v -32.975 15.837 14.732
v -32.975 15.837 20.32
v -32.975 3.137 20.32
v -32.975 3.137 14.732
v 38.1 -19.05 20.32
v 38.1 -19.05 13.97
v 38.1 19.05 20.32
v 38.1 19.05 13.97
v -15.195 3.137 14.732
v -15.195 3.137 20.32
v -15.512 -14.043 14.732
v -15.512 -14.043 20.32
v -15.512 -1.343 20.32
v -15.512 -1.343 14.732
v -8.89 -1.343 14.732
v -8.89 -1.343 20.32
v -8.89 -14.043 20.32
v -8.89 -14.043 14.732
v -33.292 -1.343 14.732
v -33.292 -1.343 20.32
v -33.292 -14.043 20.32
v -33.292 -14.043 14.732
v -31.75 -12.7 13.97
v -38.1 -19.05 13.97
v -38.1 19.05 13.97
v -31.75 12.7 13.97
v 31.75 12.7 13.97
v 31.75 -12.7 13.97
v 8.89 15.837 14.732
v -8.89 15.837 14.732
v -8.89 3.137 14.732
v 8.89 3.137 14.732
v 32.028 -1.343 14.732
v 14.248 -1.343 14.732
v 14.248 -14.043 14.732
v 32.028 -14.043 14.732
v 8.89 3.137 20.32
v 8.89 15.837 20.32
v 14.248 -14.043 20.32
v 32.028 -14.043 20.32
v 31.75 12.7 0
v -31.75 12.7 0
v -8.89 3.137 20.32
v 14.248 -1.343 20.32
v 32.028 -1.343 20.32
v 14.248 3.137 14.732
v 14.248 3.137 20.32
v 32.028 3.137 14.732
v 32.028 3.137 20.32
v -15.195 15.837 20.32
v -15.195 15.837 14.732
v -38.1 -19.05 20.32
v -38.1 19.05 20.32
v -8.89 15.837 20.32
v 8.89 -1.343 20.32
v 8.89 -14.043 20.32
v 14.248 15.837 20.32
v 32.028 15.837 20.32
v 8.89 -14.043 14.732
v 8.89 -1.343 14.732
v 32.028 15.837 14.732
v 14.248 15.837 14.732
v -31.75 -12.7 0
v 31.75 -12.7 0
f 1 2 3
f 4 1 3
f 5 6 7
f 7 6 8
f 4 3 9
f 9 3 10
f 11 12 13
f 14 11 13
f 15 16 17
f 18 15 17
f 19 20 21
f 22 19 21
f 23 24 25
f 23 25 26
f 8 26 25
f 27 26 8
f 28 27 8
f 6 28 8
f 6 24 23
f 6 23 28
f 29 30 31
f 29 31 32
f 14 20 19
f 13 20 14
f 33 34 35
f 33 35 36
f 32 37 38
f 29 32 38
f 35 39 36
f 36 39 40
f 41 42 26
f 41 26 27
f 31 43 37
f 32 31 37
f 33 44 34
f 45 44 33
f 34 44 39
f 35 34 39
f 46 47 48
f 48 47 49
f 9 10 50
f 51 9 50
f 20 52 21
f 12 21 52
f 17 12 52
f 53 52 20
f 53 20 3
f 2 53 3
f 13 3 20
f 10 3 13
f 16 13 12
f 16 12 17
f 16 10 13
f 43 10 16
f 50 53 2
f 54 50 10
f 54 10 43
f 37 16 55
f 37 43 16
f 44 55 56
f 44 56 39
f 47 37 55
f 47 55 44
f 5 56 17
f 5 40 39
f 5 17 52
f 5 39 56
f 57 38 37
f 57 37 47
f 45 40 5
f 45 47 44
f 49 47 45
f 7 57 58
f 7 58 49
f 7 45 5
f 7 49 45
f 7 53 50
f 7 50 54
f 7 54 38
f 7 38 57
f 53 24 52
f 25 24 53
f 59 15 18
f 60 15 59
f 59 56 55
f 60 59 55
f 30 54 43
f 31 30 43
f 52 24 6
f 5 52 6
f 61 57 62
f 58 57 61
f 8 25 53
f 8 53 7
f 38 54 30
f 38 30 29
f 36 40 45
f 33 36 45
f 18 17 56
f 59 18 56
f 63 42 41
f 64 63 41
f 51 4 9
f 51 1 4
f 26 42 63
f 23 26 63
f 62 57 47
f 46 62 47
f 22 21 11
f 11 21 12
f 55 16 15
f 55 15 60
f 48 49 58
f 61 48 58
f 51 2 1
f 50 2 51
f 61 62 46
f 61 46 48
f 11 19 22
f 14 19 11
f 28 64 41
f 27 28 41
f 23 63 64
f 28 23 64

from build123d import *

# Parameters (mm, degrees)
F0_W     = 76.2
F0_H     = 38.1
F1_DEPTH = 20.32
F2_W     = 63.5
F2_H     = 6.35
F3_DEPTH = 13.97
F4_W     = 17.78
F4_H     = 6.35
F5_DEPTH = 5.588


with BuildPart() as f1:
    # F0 (on Top) → F1 (new body)
    with BuildSketch(Plane.XY):
        Rectangle(F0_W, F0_H)
    extrude(amount=F1_DEPTH)

    # F2 (on face) → F3 (cut)
    with BuildSketch(Plane(origin=(0, 0, 0), x_dir=(1, 0, 0), z_dir=(0, 0, -1))):
        Polygon((-31.75, -12.7), (-31.75, 12.7), (-31.75, 19.05), (-38.1, 19.05), (-38.1, -19.05), (-31.75, -19.05), align=None)
        with Locations((0, 15.875)):
            Rectangle(F2_W, F2_H)
        Polygon((31.75, 19.05), (31.75, 12.7), (31.75, -12.7), (31.75, -19.05), (38.1, -19.05), (38.1, 19.05), align=None)
        with Locations((0, -15.875)):
            Rectangle(F2_W, F2_H)
    extrude(amount=-F3_DEPTH, mode=Mode.SUBTRACT)

    # F4 (on face) → F5 (cut)
    with BuildSketch(Plane.XY.offset(20.32)):
        with Locations((23.13825, 12.661981)):
            Rectangle(F4_W, F4_H)
        with Locations((23.13825, 6.311981)):
            Rectangle(F4_W, F4_H)
        with Locations((23.13825, -4.518458)):
            Rectangle(F4_W, F4_H)
        with Locations((23.13825, -10.868458)):
            Rectangle(F4_W, F4_H)
        with Locations((0, -10.868458)):
            Rectangle(F4_W, F4_H)
        with Locations((0, -4.518458)):
            Rectangle(F4_W, F4_H)
        with Locations((-24.402459, -10.868458)):
            Rectangle(F4_W, F4_H)
        with Locations((-24.402459, -4.518458)):
            Rectangle(F4_W, F4_H)
        with Locations((-24.085267, 6.311981)):
            Rectangle(F4_W, F4_H)
        with Locations((-24.085267, 12.661981)):
            Rectangle(F4_W, F4_H)
        with Locations((0, 12.661981)):
            Rectangle(F4_W, F4_H)
        with Locations((0, 6.311981)):
            Rectangle(F4_W, F4_H)
    extrude(amount=-F5_DEPTH, mode=Mode.SUBTRACT)


solid = f1.part
